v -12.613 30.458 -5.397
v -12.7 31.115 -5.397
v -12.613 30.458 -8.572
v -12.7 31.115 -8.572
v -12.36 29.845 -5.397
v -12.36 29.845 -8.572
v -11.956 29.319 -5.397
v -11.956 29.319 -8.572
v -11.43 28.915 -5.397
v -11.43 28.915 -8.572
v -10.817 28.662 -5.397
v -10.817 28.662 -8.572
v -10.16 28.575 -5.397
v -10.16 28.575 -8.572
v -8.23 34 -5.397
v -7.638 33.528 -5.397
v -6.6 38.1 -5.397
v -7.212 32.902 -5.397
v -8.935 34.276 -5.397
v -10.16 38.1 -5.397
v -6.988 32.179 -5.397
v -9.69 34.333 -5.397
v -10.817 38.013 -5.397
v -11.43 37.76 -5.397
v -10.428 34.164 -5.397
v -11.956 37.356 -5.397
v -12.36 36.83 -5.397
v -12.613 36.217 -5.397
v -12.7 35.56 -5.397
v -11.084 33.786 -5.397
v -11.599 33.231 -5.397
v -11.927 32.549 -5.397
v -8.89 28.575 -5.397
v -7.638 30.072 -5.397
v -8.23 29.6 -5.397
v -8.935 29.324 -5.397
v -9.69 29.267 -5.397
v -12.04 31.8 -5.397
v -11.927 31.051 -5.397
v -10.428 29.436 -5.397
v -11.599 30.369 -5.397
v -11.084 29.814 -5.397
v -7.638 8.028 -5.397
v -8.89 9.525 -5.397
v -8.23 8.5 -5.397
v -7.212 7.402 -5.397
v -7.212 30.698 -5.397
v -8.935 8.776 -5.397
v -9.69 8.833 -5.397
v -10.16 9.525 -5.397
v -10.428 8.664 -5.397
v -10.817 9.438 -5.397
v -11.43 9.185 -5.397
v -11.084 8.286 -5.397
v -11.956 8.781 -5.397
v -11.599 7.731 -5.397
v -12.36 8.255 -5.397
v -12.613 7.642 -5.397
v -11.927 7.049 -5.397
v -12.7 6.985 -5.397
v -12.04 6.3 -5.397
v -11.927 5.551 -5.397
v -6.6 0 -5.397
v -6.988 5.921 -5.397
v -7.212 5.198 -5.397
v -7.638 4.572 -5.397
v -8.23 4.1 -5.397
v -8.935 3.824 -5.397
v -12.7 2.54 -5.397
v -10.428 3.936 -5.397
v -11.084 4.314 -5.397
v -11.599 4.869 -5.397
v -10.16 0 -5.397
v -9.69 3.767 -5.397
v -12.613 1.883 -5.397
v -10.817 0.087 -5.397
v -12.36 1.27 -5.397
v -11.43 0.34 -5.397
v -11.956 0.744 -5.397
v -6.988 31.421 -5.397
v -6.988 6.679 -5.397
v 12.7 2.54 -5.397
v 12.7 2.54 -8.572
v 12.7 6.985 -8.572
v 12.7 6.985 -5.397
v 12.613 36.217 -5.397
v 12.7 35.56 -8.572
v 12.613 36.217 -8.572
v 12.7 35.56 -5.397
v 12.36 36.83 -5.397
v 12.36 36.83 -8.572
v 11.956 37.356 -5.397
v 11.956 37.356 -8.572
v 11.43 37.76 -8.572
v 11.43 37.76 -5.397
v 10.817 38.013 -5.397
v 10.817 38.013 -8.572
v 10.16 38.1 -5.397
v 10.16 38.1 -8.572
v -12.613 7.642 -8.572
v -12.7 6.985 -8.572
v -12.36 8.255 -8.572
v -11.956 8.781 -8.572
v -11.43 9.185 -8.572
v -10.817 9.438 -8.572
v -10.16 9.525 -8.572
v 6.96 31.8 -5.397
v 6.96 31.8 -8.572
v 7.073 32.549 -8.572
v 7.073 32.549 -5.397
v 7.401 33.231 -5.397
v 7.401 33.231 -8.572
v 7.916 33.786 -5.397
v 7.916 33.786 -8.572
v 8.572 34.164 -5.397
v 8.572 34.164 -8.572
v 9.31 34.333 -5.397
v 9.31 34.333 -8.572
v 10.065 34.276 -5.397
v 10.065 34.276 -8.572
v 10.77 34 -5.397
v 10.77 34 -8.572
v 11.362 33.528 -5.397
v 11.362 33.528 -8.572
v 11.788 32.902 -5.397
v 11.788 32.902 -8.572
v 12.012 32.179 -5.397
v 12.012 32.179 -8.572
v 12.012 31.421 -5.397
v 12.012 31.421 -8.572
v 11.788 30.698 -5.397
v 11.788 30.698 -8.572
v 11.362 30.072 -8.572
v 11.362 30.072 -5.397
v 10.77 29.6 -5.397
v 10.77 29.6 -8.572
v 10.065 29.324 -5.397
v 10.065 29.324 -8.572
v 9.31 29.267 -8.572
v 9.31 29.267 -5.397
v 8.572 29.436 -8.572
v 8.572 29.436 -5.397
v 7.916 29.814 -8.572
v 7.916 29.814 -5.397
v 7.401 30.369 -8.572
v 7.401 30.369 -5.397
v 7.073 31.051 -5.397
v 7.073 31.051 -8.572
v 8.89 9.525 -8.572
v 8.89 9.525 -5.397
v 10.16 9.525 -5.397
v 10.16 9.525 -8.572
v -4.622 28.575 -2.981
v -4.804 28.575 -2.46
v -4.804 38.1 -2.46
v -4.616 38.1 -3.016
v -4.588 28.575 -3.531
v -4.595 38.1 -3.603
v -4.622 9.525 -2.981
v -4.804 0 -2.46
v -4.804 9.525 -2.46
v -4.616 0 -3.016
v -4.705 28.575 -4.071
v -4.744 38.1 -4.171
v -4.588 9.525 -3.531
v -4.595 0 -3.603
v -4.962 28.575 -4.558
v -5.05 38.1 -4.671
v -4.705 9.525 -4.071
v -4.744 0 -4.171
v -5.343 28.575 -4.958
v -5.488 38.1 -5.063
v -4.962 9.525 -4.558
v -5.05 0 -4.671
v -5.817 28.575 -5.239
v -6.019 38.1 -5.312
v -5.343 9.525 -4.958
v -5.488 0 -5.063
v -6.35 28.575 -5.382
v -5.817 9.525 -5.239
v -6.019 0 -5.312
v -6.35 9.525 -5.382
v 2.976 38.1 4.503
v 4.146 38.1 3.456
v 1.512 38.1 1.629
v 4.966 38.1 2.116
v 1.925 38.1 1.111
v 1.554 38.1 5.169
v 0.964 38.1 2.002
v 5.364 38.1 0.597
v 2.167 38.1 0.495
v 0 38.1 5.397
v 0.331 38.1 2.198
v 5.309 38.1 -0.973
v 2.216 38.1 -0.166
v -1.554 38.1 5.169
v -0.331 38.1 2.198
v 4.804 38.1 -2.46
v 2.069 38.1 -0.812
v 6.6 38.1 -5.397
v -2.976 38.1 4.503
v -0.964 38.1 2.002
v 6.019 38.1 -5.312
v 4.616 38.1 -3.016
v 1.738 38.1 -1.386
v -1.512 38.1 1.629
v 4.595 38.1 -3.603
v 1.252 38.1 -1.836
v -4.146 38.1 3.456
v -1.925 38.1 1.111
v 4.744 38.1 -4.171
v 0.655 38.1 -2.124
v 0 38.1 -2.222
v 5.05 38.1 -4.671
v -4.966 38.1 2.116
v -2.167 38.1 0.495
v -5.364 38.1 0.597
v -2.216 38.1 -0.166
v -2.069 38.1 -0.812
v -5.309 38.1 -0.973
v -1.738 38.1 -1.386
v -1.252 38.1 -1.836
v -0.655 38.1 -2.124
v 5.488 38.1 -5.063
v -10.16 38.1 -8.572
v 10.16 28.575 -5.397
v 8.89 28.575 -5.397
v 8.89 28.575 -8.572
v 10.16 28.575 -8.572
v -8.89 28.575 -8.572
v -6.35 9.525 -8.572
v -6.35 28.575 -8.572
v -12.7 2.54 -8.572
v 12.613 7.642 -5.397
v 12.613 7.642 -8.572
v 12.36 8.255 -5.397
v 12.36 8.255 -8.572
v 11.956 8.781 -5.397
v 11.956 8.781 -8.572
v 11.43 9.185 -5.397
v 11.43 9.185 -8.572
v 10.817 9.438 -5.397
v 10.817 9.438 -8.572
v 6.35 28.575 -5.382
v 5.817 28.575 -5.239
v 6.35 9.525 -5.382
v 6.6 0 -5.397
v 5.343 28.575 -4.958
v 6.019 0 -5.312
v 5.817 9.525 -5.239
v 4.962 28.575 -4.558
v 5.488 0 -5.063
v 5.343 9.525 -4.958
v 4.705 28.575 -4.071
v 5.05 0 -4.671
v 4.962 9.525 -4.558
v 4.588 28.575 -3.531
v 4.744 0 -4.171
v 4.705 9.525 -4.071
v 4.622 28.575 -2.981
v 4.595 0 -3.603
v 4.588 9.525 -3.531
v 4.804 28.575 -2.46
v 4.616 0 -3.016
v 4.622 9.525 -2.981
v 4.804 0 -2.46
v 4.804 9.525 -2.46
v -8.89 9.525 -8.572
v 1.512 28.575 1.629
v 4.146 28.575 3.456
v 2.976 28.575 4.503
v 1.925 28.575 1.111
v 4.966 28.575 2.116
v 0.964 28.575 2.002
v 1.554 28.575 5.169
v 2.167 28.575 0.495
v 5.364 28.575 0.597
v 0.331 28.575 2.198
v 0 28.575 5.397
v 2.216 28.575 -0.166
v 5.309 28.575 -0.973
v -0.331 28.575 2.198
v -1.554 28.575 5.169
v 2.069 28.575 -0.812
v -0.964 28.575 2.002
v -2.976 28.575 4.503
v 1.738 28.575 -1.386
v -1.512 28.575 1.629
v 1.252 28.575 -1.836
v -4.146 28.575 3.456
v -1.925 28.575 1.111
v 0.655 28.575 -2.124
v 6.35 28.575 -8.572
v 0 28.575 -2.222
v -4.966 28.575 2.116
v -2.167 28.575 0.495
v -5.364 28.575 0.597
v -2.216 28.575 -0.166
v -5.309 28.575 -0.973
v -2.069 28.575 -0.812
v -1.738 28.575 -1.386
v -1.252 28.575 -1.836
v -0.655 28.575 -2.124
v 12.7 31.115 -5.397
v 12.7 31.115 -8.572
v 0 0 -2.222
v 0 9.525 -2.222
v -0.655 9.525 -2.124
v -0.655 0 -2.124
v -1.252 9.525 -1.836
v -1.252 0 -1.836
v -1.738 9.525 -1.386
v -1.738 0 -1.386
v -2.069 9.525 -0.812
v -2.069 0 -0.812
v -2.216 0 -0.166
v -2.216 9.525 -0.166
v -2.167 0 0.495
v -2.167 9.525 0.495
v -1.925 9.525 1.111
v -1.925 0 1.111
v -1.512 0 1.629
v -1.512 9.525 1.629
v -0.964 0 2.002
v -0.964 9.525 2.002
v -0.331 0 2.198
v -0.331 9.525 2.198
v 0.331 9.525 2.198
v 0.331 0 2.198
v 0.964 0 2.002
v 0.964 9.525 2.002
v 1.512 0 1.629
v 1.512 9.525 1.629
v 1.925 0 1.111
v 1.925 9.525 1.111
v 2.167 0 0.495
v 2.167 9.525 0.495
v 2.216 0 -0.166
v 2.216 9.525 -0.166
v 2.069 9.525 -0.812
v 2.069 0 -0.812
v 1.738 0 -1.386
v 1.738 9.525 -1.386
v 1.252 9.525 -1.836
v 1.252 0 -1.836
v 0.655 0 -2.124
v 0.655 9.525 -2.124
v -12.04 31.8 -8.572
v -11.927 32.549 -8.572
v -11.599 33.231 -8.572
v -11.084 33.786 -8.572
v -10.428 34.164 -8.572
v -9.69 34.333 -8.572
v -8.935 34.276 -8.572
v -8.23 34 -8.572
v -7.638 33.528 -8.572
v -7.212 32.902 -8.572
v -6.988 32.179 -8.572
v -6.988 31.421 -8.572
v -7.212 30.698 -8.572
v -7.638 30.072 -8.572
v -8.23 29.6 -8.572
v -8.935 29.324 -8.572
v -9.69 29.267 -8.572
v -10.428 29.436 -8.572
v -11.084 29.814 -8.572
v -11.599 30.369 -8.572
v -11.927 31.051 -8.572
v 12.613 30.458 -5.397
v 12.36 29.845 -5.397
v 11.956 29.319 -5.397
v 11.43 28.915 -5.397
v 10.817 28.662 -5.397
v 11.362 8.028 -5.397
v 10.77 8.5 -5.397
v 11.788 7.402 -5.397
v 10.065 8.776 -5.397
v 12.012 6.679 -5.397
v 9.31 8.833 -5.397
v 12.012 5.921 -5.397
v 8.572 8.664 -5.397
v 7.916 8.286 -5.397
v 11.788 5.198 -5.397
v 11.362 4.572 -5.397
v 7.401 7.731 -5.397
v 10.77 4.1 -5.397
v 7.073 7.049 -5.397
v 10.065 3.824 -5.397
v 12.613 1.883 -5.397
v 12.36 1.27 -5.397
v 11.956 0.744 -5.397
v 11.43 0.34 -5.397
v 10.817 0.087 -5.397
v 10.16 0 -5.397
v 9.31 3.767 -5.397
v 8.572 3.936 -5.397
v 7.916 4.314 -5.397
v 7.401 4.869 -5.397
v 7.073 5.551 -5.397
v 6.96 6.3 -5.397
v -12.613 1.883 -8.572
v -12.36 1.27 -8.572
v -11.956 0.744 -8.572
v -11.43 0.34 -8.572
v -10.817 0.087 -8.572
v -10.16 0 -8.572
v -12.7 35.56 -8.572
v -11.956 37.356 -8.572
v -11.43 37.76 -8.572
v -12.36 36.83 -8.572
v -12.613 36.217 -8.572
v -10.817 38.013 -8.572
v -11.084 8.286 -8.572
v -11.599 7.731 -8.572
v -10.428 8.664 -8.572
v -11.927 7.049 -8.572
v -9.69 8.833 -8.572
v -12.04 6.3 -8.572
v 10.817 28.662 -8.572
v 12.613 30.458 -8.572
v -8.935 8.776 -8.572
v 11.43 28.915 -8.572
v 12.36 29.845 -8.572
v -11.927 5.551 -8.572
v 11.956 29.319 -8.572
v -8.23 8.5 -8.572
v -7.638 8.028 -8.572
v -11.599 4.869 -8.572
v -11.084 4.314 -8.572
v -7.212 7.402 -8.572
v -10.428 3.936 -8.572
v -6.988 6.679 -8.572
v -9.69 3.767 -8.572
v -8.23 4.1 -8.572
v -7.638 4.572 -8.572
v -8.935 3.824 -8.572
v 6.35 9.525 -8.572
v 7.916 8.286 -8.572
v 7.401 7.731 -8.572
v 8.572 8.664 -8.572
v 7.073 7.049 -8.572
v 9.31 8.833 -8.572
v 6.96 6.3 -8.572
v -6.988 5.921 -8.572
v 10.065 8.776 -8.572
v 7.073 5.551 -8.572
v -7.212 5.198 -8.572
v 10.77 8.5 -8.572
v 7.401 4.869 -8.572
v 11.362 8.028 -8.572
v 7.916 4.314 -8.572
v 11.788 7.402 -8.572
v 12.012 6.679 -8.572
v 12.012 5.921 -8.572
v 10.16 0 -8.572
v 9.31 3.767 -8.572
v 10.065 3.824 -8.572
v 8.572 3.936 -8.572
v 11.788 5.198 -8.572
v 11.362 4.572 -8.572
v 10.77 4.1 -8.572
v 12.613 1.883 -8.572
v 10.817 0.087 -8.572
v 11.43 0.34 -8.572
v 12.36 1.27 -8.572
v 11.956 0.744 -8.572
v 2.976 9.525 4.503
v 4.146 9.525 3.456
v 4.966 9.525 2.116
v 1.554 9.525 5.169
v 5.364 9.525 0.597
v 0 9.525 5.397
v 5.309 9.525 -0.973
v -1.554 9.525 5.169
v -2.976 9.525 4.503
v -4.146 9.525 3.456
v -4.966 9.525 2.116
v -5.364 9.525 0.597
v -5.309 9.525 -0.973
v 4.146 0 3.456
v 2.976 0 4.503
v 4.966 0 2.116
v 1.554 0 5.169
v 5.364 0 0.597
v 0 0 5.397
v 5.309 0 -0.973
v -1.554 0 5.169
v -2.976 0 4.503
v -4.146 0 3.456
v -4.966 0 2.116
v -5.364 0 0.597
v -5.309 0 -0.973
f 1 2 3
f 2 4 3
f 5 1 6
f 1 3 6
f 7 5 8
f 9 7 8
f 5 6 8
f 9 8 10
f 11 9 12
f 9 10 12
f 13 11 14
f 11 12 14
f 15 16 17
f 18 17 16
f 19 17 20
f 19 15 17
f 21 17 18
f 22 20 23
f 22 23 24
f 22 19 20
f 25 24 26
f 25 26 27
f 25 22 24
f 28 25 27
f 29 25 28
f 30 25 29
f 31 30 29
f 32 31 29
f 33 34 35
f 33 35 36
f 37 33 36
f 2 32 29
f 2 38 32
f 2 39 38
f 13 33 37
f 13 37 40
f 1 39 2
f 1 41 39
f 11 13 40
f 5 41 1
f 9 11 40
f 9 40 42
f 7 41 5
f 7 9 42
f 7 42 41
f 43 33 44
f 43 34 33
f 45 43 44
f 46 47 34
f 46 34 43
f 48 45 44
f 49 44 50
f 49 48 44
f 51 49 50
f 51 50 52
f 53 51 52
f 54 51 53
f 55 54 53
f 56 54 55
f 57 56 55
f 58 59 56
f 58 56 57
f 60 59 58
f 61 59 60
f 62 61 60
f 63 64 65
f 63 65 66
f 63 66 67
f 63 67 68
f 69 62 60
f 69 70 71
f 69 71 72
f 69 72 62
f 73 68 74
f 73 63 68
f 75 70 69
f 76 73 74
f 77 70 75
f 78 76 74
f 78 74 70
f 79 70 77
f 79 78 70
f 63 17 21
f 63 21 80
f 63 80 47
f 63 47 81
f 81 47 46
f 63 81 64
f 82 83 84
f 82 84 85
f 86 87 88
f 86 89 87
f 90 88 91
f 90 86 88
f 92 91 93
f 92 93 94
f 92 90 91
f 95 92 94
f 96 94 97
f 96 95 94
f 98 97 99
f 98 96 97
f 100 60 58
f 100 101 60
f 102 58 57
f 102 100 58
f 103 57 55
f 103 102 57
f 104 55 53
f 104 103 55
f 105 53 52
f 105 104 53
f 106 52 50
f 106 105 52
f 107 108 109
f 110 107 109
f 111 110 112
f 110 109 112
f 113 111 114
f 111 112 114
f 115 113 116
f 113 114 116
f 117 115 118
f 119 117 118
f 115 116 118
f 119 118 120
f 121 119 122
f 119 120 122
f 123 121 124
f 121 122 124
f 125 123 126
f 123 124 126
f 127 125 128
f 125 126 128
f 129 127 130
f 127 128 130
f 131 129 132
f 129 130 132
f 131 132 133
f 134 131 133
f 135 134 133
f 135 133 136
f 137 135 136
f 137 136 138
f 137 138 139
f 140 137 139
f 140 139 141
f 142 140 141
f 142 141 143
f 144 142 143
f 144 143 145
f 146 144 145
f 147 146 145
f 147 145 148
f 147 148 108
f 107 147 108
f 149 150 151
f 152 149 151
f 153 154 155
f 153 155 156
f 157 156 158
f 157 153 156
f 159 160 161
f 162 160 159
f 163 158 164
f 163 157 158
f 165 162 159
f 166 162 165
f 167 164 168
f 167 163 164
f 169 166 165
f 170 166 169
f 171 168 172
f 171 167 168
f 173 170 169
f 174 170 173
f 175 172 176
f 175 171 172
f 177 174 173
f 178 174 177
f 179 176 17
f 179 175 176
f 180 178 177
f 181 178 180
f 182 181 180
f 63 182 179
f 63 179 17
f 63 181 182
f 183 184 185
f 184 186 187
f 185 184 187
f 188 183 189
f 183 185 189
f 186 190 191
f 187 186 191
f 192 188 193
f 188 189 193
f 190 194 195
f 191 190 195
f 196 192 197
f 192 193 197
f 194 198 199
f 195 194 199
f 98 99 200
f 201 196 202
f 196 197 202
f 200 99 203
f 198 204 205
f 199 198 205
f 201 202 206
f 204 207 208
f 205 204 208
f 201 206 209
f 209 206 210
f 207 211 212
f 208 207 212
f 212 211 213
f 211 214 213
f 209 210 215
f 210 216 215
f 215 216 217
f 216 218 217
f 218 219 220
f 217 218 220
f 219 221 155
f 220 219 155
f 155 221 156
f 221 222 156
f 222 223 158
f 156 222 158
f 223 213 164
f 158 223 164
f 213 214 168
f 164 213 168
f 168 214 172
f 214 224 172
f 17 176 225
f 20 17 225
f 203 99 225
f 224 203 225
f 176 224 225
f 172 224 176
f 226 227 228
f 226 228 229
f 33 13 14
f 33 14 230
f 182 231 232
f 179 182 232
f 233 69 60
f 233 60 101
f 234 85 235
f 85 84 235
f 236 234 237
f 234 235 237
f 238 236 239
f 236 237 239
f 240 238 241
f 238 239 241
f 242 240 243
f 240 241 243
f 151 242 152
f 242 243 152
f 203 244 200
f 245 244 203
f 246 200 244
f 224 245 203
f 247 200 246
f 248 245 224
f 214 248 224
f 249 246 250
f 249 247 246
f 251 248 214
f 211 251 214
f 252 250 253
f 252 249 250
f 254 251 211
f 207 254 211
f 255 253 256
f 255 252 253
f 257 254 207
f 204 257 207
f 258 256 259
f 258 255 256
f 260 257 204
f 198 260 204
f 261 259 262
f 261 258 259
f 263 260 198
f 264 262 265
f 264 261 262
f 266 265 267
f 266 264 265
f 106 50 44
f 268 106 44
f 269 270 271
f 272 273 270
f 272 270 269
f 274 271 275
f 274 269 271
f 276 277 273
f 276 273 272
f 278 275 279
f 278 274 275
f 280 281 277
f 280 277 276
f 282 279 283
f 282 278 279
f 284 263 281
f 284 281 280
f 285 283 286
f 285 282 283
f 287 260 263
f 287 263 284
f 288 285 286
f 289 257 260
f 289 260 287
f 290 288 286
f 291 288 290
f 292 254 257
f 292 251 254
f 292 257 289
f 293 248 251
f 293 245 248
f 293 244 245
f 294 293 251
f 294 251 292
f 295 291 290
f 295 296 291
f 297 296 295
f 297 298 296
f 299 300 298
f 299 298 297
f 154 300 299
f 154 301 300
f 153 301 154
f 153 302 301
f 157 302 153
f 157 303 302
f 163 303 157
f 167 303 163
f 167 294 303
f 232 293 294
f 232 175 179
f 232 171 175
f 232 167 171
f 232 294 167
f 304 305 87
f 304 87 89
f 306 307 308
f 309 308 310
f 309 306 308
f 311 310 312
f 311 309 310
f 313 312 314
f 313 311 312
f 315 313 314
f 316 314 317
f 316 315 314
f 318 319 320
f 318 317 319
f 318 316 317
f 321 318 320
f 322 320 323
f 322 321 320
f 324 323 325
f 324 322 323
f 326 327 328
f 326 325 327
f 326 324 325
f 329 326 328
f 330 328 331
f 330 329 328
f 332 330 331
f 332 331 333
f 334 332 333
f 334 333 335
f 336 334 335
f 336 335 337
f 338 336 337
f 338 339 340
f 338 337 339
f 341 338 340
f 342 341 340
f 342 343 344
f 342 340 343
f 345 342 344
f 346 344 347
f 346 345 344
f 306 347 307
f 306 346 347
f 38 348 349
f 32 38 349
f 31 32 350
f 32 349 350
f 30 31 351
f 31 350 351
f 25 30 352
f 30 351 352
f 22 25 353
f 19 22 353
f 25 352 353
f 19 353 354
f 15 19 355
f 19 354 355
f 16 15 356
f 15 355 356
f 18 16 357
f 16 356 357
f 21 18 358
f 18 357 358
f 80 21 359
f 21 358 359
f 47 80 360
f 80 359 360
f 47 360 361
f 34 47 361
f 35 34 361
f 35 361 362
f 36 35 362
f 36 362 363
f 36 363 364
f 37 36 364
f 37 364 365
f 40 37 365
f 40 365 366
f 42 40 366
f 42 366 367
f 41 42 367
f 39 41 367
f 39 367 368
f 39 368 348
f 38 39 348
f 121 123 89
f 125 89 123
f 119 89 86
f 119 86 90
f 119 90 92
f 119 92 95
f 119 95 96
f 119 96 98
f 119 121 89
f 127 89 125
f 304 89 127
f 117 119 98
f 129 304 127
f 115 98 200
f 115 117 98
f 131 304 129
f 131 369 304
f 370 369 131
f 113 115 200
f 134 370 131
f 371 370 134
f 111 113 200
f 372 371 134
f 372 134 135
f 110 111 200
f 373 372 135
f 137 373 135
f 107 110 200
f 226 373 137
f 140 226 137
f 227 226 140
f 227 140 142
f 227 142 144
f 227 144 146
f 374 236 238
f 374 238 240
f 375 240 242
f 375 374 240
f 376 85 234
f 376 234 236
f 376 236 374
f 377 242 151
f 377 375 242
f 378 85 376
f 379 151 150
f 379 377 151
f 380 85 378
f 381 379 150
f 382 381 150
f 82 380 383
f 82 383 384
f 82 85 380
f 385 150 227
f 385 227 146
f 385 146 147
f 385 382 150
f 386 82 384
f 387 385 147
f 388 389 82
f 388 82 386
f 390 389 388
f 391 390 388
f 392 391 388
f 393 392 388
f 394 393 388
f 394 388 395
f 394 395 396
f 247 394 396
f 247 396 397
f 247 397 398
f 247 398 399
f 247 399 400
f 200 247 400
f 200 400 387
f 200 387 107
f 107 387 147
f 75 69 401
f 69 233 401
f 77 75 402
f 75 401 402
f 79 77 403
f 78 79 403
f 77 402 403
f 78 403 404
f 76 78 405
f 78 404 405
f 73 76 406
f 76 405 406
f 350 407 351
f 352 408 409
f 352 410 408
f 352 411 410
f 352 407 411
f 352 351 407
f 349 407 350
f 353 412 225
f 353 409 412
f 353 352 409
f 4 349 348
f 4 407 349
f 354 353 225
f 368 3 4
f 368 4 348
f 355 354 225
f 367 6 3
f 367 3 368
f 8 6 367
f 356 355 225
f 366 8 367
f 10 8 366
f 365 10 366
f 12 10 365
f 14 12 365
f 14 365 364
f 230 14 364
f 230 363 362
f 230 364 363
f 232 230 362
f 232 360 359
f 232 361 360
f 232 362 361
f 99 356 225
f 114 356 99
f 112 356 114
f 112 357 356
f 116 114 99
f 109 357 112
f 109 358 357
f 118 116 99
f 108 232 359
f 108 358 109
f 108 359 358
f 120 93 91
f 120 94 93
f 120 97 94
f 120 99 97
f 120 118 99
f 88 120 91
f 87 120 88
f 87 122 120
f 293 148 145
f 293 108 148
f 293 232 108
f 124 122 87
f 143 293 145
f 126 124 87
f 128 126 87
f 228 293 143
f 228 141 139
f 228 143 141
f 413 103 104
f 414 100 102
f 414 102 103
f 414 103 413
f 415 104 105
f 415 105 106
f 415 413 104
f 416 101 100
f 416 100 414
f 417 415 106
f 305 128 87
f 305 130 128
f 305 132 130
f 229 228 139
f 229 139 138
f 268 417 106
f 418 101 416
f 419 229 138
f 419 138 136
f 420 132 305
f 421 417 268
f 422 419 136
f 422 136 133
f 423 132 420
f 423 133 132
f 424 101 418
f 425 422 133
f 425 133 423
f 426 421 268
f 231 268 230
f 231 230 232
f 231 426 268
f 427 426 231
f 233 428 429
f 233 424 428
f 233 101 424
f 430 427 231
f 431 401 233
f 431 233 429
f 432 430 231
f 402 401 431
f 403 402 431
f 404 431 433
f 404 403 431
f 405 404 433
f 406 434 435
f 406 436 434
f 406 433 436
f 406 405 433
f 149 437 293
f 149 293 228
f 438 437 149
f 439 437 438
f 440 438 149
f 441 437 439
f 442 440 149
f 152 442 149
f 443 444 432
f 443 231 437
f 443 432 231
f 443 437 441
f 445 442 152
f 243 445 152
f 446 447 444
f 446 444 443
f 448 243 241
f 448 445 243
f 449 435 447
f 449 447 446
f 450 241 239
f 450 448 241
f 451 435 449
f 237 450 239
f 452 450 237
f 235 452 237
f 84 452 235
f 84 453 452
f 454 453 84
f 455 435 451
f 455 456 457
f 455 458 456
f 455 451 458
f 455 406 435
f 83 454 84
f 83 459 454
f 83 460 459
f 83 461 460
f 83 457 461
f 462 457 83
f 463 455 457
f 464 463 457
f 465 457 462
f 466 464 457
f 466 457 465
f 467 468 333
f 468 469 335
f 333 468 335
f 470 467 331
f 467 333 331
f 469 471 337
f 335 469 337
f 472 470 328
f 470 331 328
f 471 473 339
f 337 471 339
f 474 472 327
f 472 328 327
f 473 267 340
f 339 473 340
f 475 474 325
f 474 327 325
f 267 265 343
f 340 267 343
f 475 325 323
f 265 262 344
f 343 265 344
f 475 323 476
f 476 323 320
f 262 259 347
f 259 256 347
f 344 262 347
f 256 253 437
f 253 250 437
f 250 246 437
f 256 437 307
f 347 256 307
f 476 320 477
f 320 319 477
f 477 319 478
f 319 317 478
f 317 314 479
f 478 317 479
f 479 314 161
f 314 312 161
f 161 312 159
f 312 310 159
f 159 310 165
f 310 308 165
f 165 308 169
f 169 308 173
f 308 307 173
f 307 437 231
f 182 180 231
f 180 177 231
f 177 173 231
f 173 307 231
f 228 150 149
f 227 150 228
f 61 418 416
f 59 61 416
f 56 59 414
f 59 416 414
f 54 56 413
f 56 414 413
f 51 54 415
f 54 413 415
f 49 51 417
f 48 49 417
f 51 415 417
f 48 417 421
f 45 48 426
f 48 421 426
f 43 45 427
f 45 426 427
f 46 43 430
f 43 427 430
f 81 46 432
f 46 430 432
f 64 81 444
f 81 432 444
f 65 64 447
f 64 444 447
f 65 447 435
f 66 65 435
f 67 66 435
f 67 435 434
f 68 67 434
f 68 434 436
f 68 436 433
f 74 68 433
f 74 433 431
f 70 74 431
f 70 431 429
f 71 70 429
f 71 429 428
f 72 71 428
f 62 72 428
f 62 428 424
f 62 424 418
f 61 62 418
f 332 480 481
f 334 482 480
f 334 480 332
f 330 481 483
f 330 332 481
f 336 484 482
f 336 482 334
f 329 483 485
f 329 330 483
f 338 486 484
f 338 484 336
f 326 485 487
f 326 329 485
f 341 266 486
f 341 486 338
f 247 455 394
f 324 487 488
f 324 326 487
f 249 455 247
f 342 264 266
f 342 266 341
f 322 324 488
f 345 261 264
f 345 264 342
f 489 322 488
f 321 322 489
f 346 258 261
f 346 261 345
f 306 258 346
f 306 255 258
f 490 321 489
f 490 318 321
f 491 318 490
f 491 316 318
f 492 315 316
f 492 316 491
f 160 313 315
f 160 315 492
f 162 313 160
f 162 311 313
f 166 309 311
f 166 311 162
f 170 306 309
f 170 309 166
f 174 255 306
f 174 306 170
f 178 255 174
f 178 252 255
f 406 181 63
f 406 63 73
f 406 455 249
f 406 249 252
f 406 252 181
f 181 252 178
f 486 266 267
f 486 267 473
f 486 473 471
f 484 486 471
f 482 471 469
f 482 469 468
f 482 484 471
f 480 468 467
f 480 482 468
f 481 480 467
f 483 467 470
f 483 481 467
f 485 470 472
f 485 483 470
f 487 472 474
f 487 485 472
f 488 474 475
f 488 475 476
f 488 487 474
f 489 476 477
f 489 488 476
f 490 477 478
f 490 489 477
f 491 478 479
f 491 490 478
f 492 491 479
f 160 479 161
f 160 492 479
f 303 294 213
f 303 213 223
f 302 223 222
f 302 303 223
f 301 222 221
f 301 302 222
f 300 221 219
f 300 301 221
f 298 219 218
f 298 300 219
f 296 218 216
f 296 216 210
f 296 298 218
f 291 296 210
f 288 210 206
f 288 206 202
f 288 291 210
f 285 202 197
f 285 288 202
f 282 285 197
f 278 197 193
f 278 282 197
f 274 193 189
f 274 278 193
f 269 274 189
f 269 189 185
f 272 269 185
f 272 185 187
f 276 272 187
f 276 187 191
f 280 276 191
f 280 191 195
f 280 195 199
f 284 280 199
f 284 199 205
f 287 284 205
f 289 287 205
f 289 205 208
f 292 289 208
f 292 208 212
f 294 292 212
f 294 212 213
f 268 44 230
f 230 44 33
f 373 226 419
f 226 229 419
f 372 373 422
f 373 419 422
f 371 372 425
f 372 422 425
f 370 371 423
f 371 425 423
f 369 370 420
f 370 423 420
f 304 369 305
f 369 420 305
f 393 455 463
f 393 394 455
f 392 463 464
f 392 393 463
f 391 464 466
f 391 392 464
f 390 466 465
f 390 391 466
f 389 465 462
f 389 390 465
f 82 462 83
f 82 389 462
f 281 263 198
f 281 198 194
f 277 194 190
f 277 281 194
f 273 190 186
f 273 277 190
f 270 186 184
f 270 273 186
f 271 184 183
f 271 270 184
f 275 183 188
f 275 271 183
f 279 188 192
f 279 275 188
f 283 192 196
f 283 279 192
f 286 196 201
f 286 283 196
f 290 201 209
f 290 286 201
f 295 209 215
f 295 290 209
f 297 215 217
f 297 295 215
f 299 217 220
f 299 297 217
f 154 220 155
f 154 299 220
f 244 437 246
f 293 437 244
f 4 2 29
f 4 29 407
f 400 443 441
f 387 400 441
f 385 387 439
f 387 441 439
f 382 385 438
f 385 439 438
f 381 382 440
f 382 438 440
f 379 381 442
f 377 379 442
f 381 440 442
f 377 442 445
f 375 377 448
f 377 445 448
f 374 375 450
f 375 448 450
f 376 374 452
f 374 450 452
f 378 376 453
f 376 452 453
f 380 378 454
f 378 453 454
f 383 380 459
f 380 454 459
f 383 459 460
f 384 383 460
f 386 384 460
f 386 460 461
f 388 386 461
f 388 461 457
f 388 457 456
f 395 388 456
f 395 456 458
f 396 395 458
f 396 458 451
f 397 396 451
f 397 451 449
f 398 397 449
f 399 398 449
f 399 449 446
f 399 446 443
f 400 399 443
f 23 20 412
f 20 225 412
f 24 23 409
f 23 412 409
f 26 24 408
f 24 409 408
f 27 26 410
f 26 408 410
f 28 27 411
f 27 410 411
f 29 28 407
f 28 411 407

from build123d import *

# Parameters (mm, degrees)
SKETCH1_R           = 2.2225
BOSS_EXTRUDE1_DEPTH = 38.1
SKETCH3_W           = 12.7
SKETCH3_H           = 19.05
CUT_EXTRUDE2_DEPTH  = 43.521276806
SKETCH8_W           = 3.81
SKETCH8_H           = 19.05
CUT_EXTRUDE4_DEPTH  = 42.586422571
FILLET1_R           = 2.54
FILLET2_R           = 2.54
FILLET3_R           = 2.54
FILLET4_R           = 2.54
FILLET5_R           = 2.54
FILLET6_R           = 2.54
FILLET7_R           = 2.54
FILLET8_R           = 2.54
SKETCH9_R           = 2.54
CUT_EXTRUDE5_DEPTH  = 43.521276806


with BuildPart() as part:
    # Sketch1 → Boss-Extrude1 (new body)
    with BuildSketch(Plane(origin=(0, 0, 0), x_dir=(1, 0, 0), z_dir=(0, 1, 0))):
        with BuildLine():
            Line((-12.7, 8.572431324), (12.7, 8.572431324))
            Line((12.7, 8.572431324), (12.7, 5.397431324))
            Line((12.7, 5.397431324), (6.600302959, 5.397431324))
            ThreePointArc((6.600302959, 5.397431324), (4.87882252, 4.432224955), (4.804297319, 2.460027138))
            ThreePointArc((4.804297319, 2.460027138), (0, -5.3975), (-4.804297319, 2.460027138))
            ThreePointArc((-4.804297319, 2.460027138), (-4.87882252, 4.432224955), (-6.600302959, 5.397431324))
            Line((-6.600302959, 5.397431324), (-12.7, 5.397431324))
            Line((-12.7, 5.397431324), (-12.7, 8.572431324))
        make_face()
        with Locations(Location((0, 0, 0), (0, 0, 90))):
            Circle(SKETCH1_R, mode=Mode.SUBTRACT)
    extrude(amount=BOSS_EXTRUDE1_DEPTH)

    # Sketch3 → Cut-Extrude2 (cut, through all)
    with BuildSketch(Plane(origin=(0, 0, -8.572431324), x_dir=(-1, 0, 0), z_dir=(0, 0, -1))):
        with Locations((0, 19.05)):
            Rectangle(SKETCH3_W, SKETCH3_H)
    extrude(amount=-CUT_EXTRUDE2_DEPTH, mode=Mode.SUBTRACT)

    # Sketch8 → Cut-Extrude4 (cut, through all)
    with BuildSketch(Plane.XY.offset(-5.397431324)):
        with Locations((-10.795, 19.05)):
            Rectangle(SKETCH8_W, SKETCH8_H)
        with Locations((10.795, 19.05)):
            Rectangle(SKETCH8_W, SKETCH8_H)
    extrude(amount=-CUT_EXTRUDE4_DEPTH, mode=Mode.SUBTRACT)

    # Fillet1
    fillet1_edges = [part.edges().sort_by_distance(p)[0] for p in [
        (12.7, 38.1, -6.984931324),
    ]]
    fillet(fillet1_edges, radius=FILLET1_R)

    # Fillet2
    fillet2_edges = [part.edges().sort_by_distance(p)[0] for p in [
        (-12.7, 38.1, -6.984931324),
    ]]
    fillet(fillet2_edges, radius=FILLET2_R)

    # Fillet3
    fillet3_edges = [part.edges().sort_by_distance(p)[0] for p in [
        (-12.7, 28.575, -6.984931324),
    ]]
    fillet(fillet3_edges, radius=FILLET3_R)

    # Fillet4
    fillet4_edges = [part.edges().sort_by_distance(p)[0] for p in [
        (12.7, 9.525, -6.984931324),
    ]]
    fillet(fillet4_edges, radius=FILLET4_R)

    # Fillet5
    fillet5_edges = [part.edges().sort_by_distance(p)[0] for p in [
        (12.7, 28.575, -6.984931324),
    ]]
    fillet(fillet5_edges, radius=FILLET5_R)

    # Fillet6
    fillet6_edges = [part.edges().sort_by_distance(p)[0] for p in [
        (-12.7, 9.525, -6.984931324),
    ]]
    fillet(fillet6_edges, radius=FILLET6_R)

    # Fillet7
    fillet7_edges = [part.edges().sort_by_distance(p)[0] for p in [
        (-12.7, 0, -6.984931324),
    ]]
    fillet(fillet7_edges, radius=FILLET7_R)

    # Fillet8
    fillet8_edges = [part.edges().sort_by_distance(p)[0] for p in [
        (12.7, 0, -6.984931324),
    ]]
    fillet(fillet8_edges, radius=FILLET8_R)

    # Sketch9 → Cut-Extrude5 (cut, through all)
    with BuildSketch(Plane(origin=(0, 0, -8.572431324), x_dir=(-1, 0, 0), z_dir=(0, 0, -1))):
        with Locations((9.499999999, 31.800000027)):
            Circle(SKETCH9_R)
        with Locations((-9.499999999, 31.800000027)):
            Circle(SKETCH9_R)
        with Locations((9.499999999, 6.299999973)):
            Circle(SKETCH9_R)
        with Locations((-9.499999999, 6.299999973)):
            Circle(SKETCH9_R)
    extrude(amount=-CUT_EXTRUDE5_DEPTH, mode=Mode.SUBTRACT)


solid = part.part
